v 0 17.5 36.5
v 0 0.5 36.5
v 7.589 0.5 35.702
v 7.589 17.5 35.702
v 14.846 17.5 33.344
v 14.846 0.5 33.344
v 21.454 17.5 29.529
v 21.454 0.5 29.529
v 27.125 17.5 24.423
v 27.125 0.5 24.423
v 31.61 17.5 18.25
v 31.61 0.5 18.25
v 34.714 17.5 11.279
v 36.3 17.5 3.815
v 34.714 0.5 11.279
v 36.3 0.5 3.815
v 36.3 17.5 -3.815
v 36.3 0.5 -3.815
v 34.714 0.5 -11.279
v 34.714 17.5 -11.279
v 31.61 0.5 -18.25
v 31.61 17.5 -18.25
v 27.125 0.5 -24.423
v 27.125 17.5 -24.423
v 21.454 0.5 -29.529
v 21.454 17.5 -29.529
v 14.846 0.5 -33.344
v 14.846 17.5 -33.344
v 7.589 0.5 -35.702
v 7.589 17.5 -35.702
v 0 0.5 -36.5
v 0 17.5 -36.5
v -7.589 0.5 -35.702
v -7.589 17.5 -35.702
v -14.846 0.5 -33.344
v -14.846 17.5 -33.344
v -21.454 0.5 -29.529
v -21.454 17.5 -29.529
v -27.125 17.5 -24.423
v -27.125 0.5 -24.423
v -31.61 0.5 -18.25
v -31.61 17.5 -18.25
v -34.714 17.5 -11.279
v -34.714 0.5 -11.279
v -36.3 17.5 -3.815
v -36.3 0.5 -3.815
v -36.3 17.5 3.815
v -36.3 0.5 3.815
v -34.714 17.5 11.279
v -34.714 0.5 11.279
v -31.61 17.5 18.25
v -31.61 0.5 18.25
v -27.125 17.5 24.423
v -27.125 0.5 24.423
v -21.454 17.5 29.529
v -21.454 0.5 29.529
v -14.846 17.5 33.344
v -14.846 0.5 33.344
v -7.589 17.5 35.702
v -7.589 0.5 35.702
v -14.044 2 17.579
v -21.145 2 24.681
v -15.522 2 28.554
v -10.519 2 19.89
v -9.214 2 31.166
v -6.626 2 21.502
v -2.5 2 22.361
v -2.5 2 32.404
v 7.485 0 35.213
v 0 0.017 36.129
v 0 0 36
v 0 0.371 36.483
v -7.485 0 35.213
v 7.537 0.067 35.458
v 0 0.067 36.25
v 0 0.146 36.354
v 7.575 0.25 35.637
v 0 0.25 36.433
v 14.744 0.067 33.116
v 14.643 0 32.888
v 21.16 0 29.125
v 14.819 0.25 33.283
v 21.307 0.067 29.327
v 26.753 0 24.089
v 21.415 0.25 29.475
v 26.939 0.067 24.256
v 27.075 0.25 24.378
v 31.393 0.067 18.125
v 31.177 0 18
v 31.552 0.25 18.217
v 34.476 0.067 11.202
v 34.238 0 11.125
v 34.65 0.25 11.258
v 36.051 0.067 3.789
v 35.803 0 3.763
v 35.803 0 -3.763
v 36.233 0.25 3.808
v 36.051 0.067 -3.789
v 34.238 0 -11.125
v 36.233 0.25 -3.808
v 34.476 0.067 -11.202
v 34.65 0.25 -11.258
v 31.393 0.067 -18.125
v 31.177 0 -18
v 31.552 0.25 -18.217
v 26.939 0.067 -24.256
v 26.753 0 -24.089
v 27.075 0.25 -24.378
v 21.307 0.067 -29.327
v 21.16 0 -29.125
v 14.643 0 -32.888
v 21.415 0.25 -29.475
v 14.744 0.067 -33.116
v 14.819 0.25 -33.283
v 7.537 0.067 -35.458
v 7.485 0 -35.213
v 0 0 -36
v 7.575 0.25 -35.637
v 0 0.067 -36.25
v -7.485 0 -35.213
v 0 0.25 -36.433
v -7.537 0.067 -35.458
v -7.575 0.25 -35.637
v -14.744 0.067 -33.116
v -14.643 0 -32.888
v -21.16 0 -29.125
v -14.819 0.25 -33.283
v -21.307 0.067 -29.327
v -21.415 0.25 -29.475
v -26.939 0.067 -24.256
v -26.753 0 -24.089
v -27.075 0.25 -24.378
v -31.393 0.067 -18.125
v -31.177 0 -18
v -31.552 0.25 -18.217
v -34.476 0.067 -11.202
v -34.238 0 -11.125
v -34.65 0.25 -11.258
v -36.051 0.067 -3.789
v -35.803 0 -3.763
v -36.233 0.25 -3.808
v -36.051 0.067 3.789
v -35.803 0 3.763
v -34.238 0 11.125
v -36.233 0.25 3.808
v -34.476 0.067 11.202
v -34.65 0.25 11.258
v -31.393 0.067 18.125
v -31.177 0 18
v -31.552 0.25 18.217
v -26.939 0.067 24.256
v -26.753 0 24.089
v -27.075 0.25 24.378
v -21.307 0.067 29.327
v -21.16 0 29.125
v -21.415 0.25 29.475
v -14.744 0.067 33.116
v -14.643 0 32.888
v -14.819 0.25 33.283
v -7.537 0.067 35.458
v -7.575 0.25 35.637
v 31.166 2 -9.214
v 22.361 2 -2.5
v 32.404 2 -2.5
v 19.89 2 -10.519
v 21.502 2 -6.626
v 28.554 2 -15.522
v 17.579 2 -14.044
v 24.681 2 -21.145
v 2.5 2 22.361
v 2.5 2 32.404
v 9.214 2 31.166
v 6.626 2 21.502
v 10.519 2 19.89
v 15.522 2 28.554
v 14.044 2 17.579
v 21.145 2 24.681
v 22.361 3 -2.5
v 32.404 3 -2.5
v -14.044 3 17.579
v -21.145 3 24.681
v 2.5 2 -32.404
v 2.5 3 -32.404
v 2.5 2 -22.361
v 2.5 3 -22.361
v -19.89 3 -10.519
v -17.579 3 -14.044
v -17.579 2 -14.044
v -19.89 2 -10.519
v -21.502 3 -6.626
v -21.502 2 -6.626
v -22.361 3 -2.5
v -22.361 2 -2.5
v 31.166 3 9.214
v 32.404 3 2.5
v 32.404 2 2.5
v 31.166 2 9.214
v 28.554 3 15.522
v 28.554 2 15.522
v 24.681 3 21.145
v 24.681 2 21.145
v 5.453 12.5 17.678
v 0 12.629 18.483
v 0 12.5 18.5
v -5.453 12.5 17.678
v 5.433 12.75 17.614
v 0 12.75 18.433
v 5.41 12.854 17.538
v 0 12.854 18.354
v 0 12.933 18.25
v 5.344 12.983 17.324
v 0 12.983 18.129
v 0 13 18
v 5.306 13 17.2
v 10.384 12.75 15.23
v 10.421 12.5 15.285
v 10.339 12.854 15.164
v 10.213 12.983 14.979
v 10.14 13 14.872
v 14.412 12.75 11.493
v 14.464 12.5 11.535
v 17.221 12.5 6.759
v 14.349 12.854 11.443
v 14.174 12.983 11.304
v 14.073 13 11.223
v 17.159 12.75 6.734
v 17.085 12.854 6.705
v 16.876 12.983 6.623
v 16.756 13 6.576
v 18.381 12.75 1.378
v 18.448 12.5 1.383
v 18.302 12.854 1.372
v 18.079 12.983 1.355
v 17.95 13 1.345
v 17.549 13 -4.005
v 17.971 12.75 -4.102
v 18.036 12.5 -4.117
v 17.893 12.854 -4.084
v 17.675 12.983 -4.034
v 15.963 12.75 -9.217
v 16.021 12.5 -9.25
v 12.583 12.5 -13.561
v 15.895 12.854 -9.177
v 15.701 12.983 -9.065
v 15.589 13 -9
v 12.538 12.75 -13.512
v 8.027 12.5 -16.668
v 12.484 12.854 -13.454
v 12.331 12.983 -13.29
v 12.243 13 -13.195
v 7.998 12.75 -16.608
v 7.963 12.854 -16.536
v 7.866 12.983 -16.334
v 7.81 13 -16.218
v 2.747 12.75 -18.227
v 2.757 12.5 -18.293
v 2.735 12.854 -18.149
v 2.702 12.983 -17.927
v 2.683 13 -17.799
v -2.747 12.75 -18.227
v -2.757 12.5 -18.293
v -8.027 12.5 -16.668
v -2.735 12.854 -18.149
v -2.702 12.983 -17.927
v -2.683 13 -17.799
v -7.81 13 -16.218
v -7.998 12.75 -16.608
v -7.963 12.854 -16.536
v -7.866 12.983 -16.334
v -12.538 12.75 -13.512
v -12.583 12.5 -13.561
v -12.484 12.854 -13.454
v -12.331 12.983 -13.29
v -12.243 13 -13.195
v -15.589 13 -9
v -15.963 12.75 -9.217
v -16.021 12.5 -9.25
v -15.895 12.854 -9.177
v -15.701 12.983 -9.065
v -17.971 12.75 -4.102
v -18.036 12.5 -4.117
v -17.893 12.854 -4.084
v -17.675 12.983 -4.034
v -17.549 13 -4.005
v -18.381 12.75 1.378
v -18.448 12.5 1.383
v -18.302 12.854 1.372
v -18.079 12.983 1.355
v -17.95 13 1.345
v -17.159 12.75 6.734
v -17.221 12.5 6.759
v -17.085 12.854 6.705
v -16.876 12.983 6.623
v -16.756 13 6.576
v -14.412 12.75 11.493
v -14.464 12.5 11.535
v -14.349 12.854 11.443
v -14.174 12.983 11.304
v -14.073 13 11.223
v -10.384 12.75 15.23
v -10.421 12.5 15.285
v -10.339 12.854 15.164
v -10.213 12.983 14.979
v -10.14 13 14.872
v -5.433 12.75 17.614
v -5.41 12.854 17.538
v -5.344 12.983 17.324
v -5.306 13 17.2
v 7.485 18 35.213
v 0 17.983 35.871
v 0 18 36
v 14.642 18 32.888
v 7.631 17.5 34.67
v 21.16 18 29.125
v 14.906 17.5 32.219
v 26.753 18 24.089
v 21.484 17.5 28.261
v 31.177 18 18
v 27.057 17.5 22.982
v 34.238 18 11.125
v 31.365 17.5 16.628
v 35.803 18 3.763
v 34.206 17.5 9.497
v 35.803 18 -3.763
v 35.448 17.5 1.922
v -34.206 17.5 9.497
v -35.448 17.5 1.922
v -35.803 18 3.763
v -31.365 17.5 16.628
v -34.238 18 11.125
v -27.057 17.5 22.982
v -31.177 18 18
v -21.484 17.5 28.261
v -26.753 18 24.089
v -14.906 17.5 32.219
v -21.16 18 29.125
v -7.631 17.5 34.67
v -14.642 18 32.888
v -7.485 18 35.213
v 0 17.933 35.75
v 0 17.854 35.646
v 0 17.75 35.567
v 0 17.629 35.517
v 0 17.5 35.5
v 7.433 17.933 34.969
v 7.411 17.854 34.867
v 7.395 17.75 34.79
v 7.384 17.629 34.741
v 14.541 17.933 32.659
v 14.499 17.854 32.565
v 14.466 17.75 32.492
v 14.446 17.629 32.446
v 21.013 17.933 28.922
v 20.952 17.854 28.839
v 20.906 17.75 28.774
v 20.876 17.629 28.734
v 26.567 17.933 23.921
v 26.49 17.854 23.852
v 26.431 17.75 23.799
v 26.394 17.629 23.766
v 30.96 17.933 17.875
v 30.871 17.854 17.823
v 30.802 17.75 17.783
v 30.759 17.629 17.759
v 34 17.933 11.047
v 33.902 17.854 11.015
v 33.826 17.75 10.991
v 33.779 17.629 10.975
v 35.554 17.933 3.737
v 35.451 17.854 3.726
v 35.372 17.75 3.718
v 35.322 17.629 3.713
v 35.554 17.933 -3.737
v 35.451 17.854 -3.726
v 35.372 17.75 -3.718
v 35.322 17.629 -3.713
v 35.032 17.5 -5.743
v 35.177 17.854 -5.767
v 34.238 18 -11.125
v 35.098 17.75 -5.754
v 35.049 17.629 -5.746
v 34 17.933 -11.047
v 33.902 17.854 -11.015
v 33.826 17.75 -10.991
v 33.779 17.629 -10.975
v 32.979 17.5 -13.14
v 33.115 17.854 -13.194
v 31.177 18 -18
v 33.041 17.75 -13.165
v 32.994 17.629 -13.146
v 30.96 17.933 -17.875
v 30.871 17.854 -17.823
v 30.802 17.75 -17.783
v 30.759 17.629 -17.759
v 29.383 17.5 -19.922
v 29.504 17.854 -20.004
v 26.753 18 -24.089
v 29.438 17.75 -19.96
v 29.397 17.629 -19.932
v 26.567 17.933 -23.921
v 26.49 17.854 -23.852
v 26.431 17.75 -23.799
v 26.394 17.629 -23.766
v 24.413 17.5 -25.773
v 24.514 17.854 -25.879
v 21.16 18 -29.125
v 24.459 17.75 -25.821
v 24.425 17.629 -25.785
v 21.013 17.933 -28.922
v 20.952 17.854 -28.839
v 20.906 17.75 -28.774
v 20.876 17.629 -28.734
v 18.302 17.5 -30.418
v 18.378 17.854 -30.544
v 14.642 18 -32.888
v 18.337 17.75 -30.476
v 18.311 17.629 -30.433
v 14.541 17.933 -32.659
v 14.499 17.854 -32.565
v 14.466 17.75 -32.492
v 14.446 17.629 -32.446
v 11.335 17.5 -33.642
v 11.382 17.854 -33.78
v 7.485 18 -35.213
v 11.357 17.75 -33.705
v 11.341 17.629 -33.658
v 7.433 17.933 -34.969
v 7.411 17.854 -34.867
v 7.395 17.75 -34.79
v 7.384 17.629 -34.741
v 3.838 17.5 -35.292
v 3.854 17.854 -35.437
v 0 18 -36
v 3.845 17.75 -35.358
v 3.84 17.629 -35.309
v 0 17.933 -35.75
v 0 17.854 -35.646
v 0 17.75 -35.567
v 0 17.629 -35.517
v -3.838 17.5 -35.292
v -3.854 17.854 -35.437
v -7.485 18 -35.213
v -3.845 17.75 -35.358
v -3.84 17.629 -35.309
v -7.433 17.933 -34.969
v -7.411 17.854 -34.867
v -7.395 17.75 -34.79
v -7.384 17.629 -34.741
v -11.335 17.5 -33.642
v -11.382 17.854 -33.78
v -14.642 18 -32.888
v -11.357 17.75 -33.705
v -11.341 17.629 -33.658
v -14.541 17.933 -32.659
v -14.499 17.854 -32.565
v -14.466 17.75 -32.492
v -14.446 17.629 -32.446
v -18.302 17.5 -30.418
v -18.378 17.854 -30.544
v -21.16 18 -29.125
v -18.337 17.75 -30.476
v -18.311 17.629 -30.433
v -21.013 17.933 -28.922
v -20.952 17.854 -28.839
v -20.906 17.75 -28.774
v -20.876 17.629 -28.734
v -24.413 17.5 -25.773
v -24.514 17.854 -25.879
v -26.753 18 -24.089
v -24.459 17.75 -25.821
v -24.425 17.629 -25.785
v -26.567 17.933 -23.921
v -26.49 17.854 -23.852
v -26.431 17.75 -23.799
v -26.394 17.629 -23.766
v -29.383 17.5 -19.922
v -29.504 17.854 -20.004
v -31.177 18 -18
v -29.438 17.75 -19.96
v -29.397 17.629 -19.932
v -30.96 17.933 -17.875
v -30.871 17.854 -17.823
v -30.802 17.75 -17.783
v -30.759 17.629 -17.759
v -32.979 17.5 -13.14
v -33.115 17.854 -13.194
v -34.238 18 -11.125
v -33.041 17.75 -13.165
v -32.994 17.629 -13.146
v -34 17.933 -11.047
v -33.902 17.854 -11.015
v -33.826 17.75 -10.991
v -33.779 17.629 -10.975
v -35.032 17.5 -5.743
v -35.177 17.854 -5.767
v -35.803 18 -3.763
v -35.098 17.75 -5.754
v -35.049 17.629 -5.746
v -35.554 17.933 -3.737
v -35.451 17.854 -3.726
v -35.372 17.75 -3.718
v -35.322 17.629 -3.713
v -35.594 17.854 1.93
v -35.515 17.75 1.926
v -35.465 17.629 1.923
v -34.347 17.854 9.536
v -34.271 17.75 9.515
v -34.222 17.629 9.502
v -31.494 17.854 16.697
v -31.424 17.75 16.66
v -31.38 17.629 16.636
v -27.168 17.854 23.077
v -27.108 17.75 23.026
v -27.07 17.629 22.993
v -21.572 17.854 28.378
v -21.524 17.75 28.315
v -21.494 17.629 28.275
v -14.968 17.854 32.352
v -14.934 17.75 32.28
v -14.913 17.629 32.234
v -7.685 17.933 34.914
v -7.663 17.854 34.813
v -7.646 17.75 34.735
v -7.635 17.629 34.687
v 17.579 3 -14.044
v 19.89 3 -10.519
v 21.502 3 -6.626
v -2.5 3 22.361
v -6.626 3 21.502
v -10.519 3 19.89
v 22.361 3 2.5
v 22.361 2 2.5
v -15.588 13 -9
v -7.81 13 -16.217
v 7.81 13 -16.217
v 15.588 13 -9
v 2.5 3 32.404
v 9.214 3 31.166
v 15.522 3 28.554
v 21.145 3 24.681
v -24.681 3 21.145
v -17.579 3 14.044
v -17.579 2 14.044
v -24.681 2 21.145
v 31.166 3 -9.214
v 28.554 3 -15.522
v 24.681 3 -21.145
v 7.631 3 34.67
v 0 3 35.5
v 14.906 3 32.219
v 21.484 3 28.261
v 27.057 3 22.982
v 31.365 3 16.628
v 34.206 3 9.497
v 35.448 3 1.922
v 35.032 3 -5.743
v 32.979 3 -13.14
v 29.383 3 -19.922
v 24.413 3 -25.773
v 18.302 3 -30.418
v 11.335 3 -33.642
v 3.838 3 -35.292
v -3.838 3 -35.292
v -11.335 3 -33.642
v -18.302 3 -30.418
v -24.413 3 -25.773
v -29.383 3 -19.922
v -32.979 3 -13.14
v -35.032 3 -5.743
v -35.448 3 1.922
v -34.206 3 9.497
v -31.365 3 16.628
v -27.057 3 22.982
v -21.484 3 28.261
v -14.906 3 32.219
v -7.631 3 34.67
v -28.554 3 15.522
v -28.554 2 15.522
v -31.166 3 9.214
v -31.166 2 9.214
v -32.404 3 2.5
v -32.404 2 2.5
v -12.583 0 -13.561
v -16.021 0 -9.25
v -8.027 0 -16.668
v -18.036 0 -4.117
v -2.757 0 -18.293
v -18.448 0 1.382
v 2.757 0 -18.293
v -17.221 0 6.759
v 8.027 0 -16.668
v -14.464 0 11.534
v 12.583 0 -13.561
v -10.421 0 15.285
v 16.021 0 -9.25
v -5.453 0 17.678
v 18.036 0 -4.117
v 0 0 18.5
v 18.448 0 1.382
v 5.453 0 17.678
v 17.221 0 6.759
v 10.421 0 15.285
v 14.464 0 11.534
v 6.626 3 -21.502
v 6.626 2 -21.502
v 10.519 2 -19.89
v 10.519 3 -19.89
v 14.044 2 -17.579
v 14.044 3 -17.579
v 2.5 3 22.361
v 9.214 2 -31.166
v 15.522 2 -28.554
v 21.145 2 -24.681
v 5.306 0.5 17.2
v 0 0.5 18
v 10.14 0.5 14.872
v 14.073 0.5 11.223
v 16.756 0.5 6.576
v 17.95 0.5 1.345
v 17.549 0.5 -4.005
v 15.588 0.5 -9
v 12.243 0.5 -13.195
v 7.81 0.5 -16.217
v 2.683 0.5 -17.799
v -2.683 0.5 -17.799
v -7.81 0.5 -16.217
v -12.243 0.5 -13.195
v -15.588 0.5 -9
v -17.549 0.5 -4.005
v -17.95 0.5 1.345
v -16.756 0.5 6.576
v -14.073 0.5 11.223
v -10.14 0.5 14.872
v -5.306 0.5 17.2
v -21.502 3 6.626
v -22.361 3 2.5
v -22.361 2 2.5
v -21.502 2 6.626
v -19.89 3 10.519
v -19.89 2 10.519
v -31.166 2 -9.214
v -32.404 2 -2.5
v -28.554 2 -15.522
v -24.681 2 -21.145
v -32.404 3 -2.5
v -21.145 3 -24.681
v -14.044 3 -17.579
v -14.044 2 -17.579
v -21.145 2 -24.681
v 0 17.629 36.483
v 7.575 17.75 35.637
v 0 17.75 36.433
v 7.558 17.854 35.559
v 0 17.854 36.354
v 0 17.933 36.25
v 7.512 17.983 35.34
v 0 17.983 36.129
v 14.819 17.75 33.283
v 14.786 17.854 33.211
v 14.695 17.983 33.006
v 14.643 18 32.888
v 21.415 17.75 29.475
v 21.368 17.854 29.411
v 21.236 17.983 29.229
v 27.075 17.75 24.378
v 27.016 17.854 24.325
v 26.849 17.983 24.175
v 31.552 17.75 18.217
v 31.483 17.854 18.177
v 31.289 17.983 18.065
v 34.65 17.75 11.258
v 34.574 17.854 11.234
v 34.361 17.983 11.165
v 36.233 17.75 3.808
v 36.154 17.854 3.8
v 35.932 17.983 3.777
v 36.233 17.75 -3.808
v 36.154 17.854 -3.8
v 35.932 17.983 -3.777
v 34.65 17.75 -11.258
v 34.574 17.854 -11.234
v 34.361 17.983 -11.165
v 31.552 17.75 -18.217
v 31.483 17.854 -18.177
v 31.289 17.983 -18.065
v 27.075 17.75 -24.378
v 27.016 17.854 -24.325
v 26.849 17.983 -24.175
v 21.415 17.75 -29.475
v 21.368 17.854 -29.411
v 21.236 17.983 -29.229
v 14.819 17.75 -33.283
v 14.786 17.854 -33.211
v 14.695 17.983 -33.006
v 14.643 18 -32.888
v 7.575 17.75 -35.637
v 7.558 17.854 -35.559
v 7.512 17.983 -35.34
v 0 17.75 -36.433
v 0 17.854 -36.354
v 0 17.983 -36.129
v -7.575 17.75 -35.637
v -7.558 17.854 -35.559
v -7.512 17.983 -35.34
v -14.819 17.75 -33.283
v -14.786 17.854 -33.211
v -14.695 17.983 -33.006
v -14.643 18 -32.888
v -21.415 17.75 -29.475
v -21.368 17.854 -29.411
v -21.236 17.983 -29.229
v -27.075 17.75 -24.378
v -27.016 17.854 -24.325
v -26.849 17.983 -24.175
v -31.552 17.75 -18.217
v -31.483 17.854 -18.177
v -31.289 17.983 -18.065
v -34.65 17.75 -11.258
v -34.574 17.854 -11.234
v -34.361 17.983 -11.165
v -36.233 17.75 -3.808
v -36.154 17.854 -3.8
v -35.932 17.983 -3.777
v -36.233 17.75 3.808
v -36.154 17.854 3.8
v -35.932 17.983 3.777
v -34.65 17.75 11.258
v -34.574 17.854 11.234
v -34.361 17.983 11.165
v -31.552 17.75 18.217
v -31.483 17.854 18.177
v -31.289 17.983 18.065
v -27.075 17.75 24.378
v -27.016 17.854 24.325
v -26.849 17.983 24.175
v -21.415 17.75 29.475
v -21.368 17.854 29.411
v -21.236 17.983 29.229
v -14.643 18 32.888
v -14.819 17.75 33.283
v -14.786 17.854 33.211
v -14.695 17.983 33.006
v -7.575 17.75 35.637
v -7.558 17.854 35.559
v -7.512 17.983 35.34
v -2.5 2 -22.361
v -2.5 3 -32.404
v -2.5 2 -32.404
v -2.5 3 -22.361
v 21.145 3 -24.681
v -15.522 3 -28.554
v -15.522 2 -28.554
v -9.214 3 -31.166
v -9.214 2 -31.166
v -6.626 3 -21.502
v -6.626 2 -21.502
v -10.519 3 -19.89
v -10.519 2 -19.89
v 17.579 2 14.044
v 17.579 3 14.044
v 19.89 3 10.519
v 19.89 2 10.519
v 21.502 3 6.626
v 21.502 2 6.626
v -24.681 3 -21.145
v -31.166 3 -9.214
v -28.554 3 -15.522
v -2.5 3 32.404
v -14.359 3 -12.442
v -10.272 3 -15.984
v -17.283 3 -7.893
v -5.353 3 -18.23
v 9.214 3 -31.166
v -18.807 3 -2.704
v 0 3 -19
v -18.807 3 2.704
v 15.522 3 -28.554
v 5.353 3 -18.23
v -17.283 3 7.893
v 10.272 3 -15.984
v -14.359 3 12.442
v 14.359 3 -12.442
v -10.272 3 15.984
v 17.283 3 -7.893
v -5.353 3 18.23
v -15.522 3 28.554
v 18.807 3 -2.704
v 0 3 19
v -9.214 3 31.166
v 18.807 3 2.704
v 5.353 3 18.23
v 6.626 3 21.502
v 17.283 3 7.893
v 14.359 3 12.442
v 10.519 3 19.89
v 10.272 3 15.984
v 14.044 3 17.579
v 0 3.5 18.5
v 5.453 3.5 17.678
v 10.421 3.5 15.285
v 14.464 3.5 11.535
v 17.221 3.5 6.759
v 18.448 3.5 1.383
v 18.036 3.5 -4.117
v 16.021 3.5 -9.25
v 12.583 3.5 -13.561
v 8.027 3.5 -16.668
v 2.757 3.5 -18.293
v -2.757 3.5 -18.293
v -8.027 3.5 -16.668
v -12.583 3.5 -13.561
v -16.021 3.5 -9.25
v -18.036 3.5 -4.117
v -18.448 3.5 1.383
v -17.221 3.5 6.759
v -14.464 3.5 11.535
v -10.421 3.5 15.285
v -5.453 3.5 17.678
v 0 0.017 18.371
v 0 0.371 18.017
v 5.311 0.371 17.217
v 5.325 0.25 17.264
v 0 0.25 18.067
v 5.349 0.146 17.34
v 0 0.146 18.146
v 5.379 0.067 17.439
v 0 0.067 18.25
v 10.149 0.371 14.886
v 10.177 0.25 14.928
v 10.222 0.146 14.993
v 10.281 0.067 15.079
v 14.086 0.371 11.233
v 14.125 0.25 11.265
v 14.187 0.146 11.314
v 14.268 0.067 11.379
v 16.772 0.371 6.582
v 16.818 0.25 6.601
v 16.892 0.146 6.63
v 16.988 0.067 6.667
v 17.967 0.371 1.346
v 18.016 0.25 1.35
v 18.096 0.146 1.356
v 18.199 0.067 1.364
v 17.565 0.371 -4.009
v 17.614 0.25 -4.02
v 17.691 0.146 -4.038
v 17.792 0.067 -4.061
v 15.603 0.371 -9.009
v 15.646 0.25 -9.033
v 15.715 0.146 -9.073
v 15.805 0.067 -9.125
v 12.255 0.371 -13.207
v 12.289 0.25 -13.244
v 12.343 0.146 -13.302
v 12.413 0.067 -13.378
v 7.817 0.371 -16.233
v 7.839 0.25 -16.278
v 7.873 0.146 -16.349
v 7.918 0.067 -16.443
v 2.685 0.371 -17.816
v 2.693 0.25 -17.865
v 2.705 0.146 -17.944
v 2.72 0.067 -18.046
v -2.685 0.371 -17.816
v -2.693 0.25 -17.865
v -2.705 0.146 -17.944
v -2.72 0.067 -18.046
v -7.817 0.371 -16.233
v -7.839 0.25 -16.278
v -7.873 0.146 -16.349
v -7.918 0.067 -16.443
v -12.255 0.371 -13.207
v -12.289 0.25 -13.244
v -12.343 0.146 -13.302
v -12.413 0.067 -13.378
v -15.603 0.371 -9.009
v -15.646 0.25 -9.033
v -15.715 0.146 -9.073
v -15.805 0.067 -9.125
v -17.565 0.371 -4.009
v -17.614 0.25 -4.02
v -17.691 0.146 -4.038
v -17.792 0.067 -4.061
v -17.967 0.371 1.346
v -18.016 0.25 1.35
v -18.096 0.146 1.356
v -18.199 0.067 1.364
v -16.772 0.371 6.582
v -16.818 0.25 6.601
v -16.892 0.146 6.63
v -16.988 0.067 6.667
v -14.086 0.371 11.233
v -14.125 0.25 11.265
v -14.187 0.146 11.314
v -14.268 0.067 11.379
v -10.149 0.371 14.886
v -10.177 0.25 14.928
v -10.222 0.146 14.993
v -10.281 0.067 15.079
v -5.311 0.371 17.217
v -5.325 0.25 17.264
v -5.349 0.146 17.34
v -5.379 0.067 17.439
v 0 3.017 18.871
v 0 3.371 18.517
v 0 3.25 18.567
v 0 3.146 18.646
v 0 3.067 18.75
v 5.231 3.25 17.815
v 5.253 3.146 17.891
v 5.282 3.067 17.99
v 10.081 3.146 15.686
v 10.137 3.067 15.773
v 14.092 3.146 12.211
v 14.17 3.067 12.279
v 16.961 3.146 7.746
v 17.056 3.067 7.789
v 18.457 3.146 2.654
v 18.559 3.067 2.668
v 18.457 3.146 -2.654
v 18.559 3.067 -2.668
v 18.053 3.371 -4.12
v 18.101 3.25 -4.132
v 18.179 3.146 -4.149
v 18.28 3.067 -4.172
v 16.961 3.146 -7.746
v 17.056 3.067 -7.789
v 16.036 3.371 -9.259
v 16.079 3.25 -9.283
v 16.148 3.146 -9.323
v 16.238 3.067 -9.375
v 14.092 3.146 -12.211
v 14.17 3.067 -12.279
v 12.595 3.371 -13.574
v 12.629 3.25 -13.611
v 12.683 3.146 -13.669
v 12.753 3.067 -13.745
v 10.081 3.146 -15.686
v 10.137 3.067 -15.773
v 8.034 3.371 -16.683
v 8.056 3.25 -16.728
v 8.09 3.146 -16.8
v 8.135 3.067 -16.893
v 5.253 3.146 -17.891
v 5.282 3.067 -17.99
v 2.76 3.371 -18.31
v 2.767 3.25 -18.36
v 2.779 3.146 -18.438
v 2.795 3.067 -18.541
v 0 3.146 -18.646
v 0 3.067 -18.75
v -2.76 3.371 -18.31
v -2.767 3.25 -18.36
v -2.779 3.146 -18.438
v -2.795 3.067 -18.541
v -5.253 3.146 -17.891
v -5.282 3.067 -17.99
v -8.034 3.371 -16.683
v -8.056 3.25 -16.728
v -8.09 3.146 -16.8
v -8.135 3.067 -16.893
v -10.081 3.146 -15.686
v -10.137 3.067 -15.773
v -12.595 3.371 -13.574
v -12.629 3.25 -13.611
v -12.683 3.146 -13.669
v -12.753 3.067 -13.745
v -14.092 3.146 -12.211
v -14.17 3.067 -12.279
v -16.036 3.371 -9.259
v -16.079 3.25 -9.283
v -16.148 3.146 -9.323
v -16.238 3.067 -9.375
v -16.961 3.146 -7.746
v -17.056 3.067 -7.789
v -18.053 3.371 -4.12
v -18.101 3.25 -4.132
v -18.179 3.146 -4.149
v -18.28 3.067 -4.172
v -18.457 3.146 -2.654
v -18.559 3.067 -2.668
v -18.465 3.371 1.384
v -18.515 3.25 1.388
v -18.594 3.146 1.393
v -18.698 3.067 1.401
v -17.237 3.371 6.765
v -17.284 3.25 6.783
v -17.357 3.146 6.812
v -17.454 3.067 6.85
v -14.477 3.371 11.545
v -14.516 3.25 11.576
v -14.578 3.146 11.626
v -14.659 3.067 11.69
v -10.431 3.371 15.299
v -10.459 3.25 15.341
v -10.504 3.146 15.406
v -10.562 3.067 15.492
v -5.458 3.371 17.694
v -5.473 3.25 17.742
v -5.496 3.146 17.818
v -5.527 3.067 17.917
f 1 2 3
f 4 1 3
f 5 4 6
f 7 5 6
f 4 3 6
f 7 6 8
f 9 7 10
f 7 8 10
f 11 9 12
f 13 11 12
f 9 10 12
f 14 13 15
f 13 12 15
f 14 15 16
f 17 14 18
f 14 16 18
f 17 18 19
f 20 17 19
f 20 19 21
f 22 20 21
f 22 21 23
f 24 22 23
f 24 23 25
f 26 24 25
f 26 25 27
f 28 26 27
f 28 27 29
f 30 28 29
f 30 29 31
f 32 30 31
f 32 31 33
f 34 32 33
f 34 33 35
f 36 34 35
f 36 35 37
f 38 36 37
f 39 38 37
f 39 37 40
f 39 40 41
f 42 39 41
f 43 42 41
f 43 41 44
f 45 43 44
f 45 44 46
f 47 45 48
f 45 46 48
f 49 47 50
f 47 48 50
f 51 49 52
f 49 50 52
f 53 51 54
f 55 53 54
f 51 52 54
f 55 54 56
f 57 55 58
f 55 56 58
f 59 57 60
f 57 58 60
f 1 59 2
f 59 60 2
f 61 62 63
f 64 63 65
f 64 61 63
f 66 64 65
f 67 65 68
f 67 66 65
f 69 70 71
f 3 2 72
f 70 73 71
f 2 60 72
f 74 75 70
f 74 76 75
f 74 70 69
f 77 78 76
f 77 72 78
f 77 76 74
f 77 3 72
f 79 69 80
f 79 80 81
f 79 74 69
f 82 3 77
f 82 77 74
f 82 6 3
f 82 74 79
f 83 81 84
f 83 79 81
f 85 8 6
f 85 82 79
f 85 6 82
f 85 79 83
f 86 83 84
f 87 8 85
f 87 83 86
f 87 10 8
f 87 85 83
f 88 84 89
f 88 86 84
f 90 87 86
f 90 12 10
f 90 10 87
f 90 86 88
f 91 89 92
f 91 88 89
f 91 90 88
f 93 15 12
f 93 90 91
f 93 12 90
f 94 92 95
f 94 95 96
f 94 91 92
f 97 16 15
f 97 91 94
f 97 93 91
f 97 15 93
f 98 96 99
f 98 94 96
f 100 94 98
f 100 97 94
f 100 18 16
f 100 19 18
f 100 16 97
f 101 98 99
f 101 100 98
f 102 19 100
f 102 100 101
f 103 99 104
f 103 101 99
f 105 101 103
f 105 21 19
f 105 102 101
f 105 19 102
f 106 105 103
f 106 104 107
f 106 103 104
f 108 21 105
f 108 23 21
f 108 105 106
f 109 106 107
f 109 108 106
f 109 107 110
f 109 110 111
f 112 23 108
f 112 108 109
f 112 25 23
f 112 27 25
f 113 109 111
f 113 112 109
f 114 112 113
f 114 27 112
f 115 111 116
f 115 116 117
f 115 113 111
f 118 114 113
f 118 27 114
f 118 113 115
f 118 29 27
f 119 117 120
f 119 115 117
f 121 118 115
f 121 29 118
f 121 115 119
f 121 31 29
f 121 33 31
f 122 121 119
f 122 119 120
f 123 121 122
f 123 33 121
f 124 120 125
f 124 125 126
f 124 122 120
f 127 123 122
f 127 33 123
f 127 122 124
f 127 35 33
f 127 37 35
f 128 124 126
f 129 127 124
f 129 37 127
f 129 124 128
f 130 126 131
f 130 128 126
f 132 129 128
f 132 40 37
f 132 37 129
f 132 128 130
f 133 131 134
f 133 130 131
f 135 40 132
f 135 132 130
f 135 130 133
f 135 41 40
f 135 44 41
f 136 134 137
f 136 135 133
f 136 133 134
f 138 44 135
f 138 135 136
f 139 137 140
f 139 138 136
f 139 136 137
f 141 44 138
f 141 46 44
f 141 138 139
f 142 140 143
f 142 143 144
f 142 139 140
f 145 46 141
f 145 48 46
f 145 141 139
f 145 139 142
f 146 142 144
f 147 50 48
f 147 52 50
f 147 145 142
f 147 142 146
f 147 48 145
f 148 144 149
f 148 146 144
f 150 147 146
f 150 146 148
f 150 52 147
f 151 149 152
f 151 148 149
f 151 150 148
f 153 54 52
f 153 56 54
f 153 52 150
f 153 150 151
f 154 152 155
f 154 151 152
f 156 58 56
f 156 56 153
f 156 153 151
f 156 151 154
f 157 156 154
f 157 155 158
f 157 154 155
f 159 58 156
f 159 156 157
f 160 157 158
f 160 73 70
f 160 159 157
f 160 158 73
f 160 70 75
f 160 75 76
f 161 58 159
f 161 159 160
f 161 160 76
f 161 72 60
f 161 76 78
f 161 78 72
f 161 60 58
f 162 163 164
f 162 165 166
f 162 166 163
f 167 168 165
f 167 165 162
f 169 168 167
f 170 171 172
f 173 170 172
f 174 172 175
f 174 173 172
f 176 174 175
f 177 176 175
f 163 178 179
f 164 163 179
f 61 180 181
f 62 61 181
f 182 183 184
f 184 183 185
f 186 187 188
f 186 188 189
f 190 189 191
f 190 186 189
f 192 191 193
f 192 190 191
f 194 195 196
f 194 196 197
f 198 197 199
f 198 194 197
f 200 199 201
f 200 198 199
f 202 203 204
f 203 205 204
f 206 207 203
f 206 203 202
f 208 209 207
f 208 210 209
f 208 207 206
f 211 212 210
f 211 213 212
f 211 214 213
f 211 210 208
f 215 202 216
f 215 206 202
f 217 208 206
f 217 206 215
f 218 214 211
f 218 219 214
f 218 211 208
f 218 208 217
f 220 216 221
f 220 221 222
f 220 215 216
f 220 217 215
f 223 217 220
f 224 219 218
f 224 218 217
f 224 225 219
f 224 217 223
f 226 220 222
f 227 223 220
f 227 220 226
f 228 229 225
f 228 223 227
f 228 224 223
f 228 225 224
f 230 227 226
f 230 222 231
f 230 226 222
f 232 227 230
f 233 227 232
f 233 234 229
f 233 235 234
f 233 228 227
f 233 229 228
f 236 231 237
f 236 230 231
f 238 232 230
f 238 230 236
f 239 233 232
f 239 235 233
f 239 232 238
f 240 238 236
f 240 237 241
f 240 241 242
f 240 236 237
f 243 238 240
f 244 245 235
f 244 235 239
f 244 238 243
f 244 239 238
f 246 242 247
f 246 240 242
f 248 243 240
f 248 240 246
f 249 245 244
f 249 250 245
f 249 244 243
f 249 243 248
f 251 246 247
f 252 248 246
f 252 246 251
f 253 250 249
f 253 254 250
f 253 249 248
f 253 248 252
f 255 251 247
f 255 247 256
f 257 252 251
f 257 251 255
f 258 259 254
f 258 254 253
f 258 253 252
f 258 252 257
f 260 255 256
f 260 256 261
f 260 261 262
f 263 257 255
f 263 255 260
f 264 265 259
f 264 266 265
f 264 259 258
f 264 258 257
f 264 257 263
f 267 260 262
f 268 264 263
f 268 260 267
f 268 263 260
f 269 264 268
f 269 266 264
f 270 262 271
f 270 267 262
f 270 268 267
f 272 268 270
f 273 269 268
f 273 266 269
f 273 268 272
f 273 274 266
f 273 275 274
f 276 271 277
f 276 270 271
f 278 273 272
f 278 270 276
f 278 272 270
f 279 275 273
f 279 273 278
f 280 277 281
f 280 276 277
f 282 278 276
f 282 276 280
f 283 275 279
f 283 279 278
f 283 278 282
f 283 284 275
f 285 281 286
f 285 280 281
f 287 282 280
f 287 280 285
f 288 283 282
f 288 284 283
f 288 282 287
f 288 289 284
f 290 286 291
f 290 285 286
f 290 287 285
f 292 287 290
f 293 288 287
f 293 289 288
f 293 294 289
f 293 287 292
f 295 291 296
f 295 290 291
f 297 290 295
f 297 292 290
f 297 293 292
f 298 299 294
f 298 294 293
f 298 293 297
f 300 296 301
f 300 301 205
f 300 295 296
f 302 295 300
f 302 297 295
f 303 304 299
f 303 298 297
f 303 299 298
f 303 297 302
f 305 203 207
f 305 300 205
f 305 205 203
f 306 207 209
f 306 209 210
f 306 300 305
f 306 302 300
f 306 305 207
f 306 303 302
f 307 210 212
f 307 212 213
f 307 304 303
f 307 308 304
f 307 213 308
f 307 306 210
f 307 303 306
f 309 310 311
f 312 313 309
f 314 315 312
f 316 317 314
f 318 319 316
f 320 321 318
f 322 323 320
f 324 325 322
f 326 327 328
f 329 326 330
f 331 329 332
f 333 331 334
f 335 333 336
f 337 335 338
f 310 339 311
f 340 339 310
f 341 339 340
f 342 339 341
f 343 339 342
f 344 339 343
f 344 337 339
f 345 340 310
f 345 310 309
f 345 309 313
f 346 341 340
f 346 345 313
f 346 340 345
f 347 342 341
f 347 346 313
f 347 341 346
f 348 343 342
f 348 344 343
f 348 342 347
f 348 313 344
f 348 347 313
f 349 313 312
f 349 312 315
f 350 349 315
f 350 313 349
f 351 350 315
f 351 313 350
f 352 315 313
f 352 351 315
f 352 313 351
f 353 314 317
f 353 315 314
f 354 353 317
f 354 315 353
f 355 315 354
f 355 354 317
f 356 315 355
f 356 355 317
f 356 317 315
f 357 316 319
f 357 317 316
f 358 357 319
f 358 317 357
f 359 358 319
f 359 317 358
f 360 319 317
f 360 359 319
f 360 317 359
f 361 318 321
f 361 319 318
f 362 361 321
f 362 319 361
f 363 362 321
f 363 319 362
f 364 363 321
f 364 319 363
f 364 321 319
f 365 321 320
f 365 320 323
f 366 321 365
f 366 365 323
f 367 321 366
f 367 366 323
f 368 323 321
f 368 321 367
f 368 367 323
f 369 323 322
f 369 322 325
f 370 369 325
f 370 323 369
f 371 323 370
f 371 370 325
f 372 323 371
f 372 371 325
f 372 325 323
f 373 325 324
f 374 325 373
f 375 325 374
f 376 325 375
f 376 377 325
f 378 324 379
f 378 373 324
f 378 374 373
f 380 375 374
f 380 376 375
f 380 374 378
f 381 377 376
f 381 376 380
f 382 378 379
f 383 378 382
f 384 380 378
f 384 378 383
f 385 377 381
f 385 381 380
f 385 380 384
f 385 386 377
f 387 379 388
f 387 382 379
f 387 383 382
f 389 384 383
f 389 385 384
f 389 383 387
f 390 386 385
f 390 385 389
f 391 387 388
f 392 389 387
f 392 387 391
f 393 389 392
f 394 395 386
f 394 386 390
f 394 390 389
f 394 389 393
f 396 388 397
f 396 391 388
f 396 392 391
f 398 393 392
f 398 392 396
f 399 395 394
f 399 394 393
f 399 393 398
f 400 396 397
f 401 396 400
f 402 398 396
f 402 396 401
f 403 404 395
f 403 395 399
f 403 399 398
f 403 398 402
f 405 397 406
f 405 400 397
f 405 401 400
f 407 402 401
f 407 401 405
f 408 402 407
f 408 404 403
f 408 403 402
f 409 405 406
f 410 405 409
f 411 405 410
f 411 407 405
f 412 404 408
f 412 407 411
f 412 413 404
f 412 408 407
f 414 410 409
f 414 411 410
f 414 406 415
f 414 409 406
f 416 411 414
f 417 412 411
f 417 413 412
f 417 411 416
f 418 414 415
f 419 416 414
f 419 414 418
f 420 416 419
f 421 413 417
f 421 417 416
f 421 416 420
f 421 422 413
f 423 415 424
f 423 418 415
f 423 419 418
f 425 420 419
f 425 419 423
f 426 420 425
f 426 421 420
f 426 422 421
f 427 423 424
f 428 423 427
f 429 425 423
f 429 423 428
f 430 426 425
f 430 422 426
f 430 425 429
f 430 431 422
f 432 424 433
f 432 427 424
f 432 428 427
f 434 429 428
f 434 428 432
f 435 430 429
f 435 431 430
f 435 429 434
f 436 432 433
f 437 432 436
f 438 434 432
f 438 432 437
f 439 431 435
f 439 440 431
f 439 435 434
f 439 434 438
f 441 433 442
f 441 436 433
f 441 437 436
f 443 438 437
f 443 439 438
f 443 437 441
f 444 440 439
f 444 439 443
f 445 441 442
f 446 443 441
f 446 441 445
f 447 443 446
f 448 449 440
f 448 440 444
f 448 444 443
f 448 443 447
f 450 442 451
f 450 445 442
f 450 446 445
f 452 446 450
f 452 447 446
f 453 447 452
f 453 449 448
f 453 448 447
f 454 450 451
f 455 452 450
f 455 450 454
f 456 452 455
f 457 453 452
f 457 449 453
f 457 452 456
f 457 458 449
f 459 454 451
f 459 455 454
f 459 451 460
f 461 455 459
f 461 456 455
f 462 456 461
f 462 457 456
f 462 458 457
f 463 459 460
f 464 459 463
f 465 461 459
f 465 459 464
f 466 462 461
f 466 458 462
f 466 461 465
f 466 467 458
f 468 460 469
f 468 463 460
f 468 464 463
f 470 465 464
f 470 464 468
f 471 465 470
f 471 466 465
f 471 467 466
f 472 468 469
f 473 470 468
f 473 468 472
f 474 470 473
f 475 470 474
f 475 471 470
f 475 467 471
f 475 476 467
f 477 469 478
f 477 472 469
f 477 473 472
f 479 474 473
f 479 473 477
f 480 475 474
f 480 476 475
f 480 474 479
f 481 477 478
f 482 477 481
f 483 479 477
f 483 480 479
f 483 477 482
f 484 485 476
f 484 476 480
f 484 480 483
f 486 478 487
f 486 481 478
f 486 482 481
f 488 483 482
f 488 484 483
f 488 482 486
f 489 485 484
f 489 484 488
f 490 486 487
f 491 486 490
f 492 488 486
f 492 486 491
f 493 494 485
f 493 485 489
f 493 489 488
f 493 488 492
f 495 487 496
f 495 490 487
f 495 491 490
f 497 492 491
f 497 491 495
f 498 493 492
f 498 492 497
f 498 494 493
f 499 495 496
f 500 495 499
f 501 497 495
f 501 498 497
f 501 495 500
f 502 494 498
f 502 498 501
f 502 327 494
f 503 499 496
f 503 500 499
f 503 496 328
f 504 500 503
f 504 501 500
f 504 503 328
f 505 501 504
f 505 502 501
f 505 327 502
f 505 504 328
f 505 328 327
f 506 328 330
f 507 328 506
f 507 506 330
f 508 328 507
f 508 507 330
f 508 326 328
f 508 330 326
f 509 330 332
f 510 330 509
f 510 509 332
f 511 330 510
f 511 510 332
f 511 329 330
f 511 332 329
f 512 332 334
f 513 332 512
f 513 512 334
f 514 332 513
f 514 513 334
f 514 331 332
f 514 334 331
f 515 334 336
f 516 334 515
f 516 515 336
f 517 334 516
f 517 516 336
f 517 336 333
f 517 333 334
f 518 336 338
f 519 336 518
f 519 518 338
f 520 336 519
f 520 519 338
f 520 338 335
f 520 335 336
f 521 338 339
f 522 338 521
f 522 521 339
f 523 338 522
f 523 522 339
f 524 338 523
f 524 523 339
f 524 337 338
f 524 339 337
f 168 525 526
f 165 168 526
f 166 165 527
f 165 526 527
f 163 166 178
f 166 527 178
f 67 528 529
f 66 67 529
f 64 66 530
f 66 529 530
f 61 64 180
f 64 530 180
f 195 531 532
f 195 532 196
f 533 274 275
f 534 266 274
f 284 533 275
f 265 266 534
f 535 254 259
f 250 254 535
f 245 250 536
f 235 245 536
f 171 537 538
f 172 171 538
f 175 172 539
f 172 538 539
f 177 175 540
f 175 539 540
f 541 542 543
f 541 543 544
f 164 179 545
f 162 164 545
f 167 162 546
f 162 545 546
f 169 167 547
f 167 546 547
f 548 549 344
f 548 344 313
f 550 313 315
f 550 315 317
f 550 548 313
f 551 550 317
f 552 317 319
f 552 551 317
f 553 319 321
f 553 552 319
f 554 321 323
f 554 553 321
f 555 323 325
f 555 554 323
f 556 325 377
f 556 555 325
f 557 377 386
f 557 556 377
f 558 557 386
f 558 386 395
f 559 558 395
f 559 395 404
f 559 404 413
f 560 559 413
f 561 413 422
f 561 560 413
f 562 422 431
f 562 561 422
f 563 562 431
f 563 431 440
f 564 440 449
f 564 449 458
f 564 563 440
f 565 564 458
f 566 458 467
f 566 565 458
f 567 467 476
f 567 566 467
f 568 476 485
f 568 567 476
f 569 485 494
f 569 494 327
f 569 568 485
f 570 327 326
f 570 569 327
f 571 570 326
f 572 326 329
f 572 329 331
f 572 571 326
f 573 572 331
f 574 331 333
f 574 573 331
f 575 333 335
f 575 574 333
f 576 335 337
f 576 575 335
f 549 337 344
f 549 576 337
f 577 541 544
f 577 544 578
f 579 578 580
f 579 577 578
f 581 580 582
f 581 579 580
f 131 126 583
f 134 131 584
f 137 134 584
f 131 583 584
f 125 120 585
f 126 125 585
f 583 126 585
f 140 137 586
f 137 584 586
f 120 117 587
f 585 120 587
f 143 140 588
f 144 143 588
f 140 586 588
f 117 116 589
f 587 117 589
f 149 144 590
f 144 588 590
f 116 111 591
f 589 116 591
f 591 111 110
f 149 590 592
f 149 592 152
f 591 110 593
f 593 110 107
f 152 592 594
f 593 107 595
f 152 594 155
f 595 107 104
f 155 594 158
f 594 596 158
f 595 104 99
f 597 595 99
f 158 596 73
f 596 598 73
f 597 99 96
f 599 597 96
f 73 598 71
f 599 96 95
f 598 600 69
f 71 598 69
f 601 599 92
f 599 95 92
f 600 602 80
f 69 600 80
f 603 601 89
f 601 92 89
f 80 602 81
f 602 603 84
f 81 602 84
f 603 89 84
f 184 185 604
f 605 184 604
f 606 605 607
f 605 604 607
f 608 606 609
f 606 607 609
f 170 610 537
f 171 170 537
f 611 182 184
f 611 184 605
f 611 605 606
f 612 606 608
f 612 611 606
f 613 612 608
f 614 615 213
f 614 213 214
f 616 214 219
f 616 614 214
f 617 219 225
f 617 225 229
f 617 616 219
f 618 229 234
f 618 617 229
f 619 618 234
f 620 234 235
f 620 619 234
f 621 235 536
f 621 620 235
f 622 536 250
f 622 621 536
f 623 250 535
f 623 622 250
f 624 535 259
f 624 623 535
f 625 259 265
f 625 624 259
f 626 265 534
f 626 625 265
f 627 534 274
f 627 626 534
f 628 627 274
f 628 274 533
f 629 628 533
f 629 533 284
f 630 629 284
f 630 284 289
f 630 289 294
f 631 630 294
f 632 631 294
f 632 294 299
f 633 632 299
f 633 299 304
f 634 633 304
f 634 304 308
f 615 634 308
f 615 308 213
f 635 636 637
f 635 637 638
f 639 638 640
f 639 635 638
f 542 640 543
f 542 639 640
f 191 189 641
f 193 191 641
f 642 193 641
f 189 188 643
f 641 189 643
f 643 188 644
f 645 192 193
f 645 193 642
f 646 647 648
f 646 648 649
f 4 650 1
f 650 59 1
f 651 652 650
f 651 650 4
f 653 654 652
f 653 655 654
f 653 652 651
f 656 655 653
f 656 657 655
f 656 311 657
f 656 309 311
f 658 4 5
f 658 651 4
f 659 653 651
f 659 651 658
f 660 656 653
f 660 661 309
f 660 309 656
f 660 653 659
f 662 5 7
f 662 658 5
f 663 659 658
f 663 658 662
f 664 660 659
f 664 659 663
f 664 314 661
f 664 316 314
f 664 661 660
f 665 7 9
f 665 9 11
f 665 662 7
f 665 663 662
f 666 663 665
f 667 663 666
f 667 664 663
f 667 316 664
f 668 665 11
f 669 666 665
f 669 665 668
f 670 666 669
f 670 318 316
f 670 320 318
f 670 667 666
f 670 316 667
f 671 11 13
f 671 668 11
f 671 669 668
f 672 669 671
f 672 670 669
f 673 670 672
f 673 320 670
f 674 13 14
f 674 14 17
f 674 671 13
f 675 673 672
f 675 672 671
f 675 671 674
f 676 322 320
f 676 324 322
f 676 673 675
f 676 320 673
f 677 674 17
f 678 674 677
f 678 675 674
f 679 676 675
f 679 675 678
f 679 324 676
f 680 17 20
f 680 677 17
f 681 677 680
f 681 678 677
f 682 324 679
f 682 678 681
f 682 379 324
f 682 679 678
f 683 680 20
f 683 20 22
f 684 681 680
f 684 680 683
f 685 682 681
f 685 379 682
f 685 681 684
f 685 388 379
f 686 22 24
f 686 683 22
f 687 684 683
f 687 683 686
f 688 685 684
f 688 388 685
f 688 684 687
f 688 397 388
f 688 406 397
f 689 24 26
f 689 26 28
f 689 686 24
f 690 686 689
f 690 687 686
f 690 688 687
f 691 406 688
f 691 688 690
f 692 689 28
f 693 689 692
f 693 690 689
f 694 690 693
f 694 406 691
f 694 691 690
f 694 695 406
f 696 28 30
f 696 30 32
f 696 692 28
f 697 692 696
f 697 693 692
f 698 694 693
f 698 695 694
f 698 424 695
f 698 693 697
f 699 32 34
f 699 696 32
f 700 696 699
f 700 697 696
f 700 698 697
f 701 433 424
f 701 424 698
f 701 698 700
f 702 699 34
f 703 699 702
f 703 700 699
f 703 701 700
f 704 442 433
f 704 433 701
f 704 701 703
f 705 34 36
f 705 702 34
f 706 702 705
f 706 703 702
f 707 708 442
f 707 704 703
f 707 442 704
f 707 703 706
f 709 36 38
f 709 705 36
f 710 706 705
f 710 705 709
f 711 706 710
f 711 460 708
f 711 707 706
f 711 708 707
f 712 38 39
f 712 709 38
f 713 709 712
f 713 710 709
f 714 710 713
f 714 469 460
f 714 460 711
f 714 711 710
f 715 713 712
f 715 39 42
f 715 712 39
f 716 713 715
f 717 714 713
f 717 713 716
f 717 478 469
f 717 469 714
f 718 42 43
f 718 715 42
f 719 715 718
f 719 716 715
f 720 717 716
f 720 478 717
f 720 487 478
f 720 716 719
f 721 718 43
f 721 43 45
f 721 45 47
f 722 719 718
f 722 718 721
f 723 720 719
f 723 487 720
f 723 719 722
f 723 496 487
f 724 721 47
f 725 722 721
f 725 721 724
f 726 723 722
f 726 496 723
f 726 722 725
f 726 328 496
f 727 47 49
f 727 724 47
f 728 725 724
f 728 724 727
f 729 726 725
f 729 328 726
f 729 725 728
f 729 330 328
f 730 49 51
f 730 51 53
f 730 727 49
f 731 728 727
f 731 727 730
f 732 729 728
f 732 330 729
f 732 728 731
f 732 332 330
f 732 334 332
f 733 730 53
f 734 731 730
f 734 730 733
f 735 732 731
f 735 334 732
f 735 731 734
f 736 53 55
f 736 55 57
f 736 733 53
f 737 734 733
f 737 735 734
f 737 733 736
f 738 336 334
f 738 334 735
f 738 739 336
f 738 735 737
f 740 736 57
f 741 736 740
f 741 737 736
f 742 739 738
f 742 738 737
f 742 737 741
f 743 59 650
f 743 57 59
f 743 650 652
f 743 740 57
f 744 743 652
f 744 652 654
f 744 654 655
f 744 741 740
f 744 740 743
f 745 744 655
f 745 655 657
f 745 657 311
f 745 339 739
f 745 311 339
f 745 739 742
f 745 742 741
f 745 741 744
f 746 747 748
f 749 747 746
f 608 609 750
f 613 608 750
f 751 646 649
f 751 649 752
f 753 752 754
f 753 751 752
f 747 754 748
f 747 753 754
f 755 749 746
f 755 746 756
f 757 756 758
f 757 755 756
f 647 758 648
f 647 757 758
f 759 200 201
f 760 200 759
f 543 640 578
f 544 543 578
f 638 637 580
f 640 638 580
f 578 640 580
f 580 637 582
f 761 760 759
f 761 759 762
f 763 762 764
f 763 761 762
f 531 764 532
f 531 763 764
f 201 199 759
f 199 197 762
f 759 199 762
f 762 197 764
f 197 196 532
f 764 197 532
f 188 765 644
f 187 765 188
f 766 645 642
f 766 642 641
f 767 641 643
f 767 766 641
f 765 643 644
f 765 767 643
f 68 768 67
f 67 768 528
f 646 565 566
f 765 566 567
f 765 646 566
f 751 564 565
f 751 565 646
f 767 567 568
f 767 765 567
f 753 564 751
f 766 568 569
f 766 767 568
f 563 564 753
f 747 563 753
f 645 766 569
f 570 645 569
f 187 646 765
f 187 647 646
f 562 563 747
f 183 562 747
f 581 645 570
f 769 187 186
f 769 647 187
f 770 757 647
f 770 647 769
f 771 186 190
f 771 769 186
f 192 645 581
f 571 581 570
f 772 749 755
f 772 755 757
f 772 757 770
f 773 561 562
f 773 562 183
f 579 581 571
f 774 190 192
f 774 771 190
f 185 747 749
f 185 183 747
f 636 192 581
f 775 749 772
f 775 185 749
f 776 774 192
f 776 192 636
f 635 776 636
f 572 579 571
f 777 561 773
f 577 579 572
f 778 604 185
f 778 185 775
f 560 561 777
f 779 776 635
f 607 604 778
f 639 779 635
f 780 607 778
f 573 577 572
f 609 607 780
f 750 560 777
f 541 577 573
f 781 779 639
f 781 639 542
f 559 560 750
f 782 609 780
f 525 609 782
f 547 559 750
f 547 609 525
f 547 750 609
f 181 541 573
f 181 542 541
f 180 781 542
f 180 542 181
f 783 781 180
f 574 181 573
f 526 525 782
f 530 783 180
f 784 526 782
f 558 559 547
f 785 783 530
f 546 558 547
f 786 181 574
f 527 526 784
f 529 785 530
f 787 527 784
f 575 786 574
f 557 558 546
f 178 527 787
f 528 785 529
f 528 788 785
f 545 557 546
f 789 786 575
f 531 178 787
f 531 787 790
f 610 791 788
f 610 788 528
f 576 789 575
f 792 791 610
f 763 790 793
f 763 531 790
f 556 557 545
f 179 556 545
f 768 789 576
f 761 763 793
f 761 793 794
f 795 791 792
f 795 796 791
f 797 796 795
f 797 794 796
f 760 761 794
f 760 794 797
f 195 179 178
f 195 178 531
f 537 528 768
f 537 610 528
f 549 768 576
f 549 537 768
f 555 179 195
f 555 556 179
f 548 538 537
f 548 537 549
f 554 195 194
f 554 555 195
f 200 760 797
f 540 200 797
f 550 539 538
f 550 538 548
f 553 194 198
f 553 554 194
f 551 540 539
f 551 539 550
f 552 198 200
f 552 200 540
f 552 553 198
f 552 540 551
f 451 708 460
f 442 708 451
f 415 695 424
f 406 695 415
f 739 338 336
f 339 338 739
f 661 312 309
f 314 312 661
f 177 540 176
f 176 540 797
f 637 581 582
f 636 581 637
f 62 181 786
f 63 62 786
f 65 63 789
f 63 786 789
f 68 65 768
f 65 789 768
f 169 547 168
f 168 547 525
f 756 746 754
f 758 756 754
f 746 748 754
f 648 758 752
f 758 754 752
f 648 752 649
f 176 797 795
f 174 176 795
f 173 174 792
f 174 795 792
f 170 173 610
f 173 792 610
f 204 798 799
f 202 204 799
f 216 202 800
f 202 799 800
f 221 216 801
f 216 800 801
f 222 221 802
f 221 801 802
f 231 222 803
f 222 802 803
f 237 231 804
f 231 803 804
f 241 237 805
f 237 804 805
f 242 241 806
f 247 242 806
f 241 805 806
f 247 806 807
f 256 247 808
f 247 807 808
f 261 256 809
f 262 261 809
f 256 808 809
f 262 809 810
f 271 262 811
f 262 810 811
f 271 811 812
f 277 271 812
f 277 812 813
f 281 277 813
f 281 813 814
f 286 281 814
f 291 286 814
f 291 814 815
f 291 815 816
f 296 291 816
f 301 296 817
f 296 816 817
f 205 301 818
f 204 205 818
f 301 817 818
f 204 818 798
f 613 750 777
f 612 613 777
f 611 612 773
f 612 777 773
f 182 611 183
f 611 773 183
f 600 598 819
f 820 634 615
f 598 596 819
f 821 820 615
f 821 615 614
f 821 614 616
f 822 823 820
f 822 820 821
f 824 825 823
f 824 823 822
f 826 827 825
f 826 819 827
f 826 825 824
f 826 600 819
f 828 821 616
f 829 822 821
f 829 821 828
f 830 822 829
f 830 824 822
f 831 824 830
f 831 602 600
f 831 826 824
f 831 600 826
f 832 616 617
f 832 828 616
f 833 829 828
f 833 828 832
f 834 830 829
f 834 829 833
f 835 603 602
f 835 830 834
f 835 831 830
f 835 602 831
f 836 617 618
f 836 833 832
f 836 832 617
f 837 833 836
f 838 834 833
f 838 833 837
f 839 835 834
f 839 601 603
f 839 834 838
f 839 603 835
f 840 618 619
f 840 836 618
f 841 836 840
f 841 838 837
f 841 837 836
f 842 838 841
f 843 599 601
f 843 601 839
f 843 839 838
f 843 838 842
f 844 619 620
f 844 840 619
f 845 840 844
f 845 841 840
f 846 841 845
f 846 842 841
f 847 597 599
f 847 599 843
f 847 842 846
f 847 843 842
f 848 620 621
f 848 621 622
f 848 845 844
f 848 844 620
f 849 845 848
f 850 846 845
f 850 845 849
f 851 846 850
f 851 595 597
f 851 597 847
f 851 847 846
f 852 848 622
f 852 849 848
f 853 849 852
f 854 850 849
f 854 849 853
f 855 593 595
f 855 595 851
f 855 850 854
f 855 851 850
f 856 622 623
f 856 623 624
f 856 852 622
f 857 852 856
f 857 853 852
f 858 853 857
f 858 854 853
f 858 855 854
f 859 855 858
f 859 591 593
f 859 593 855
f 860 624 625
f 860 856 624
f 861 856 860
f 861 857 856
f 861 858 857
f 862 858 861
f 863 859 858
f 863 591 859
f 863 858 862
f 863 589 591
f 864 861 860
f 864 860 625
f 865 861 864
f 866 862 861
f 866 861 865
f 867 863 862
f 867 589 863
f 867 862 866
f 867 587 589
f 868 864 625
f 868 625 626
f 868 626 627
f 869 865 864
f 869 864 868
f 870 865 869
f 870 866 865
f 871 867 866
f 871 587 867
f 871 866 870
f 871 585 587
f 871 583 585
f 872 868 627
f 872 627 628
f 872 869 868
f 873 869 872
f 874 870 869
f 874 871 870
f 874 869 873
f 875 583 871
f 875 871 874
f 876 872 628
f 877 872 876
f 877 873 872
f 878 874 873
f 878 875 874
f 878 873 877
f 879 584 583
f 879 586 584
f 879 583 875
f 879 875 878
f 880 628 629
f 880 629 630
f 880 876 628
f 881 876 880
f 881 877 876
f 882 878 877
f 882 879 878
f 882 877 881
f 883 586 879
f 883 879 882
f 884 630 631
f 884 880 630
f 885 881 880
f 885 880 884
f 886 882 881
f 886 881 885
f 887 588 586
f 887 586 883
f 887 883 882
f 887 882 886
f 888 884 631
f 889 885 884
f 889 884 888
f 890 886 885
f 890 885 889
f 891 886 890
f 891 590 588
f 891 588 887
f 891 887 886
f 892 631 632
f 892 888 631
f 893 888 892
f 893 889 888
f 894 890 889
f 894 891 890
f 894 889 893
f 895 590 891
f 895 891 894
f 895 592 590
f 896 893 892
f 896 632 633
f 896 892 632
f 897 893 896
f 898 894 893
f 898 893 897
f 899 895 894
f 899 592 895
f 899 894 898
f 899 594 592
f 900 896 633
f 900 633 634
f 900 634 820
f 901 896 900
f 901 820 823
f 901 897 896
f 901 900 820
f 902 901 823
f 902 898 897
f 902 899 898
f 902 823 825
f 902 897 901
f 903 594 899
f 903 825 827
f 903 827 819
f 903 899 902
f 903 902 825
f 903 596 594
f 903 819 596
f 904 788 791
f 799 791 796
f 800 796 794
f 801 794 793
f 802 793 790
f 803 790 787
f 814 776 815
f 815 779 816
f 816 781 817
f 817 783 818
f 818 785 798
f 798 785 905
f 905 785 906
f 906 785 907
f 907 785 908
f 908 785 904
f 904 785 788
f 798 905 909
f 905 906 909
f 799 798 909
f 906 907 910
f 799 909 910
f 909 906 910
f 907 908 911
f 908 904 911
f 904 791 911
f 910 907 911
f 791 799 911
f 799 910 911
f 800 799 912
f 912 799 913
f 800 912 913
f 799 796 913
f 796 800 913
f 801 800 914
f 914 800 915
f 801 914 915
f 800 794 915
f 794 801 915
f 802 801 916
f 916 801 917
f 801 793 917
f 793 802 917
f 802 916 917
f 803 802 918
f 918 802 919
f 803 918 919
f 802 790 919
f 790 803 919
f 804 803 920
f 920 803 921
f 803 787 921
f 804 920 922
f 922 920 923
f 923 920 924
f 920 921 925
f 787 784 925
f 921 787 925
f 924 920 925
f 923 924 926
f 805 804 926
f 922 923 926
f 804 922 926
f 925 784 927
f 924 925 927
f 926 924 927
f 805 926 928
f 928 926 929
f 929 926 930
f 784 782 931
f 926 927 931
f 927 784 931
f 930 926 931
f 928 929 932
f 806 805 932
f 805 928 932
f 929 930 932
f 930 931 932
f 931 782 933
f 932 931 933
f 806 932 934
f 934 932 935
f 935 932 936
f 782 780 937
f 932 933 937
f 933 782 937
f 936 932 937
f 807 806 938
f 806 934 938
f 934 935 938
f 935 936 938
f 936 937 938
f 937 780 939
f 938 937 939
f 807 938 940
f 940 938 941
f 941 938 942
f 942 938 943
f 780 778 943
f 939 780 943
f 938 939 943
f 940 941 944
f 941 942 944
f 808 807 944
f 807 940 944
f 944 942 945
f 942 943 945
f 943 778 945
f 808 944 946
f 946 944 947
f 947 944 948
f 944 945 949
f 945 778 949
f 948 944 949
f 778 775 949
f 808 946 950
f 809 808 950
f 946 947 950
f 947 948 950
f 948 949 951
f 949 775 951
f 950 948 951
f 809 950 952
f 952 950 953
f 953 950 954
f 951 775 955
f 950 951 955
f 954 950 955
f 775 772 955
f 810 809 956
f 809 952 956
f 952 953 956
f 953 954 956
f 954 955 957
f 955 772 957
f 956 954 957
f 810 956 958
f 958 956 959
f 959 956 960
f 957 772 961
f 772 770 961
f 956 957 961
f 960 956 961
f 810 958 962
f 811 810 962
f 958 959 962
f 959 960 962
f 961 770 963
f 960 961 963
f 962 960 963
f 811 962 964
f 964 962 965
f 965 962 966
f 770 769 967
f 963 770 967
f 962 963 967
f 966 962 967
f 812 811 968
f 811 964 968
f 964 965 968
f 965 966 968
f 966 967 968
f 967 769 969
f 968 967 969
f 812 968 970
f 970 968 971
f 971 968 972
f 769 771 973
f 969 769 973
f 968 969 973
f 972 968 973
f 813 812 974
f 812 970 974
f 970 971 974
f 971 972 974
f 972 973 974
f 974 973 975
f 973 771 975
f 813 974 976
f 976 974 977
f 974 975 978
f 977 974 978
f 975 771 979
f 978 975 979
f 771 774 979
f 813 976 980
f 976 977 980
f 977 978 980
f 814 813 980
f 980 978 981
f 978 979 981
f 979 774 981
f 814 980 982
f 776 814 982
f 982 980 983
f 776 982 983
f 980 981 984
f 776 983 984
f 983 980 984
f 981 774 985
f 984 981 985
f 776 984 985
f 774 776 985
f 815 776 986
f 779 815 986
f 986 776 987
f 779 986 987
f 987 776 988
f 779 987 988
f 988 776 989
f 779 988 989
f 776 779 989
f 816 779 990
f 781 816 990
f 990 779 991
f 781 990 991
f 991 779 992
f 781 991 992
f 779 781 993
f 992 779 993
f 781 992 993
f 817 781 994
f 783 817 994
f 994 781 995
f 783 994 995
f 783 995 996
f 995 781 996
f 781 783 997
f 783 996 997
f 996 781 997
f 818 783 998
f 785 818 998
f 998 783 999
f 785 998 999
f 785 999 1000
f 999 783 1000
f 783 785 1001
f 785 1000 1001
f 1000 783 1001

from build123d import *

# Parameters (mm, degrees)
SKETCH2_R           = 36.5
SKETCH2_R_2         = 18
BOSS_EXTRUDE1_DEPTH = 3
SKETCH3_R           = 36.5
SKETCH3_R_2         = 35.5
BOSS_EXTRUDE2_DEPTH = 15
SKETCH4_R           = 18.5
SKETCH4_R_2         = 18
BOSS_EXTRUDE3_DEPTH = 10
FILLET1_R           = 0.5
CUT_EXTRUDE1_DEPTH  = 1


with BuildPart() as part:
    # Sketch2 → Boss-Extrude1 (new body)
    with BuildSketch(Plane(origin=(0, 0, 0), x_dir=(1, 0, 0), z_dir=(0, 1, 0))):
        with Locations(Location((0, 0, 0), (0, 0, 270))):
            Circle(SKETCH2_R)
        with Locations(Location((0, 0, 0), (0, 0, 270))):
            Circle(SKETCH2_R_2, mode=Mode.SUBTRACT)
    extrude(amount=BOSS_EXTRUDE1_DEPTH)

    # Sketch3 → Boss-Extrude2 (add)
    with BuildSketch(Plane(origin=(0, 3, 0), x_dir=(1, 0, 0), z_dir=(0, 1, 0))):
        with Locations(Location((0, 0, 0), (0, 0, 270))):
            Circle(SKETCH3_R)
        with Locations(Location((0, 0, 0), (0, 0, 270))):
            Circle(SKETCH3_R_2, mode=Mode.SUBTRACT)
    extrude(amount=BOSS_EXTRUDE2_DEPTH)

    # Sketch4 → Boss-Extrude3 (add)
    with BuildSketch(Plane(origin=(0, 3, 0), x_dir=(1, 0, 0), z_dir=(0, 1, 0))):
        with Locations(Location((0, 0, 0), (0, 0, 270))):
            Circle(SKETCH4_R)
        with Locations(Location((0, 0, 0), (0, 0, 270))):
            Circle(SKETCH4_R_2, mode=Mode.SUBTRACT)
    extrude(amount=BOSS_EXTRUDE3_DEPTH)

    # Fillet1
    fillet1_edges = [part.edges().sort_by_distance(p)[0] for p in [
        (0, 18, -35.5),
        (0, 18, -36.5),
        (0, 3, -18.5),
        (0, 13, -18.5),
        (0, 0, -36.5),
        (0, 0, -18),
    ]]
    fillet(fillet1_edges, radius=FILLET1_R - 0.0001)  # a hair under: the kernel refuses the full size

    # Sketch5 → Cut-Extrude1 (cut)
    with BuildSketch(Plane(origin=(0, 3, 0), x_dir=(1, 0, 0), z_dir=(0, 1, 0))):
        with BuildLine():
            ThreePointArc((-2.5, 22.360679775), (-8.610377228, 20.787289482), (-14.043621348, 17.579155254))
            Line((-14.043621348, 17.579155254), (-21.145111522, 24.680645428))
            ThreePointArc((-21.145111522, 24.680645428), (-12.437211552, 30.026084807), (-2.5, 32.403703492))
            Line((-2.5, 32.403703492), (-2.5, 22.360679775))
        make_face()
        with BuildLine():
            Line((14.043621348, 17.579155254), (21.145111522, 24.680645428))
            ThreePointArc((21.145111522, 24.680645428), (12.437211552, 30.026084807), (2.5, 32.403703492))
            Line((2.5, 32.403703492), (2.5, 22.360679775))
            ThreePointArc((2.5, 22.360679775), (8.610377228, 20.787289482), (14.043621348, 17.579155254))
        make_face()
        with BuildLine():
            Line((22.360679775, 2.5), (32.403703492, 2.5))
            ThreePointArc((32.403703492, 2.5), (30.026084807, 12.437211552), (24.680645428, 21.145111522))
            Line((24.680645428, 21.145111522), (17.579155254, 14.043621348))
            ThreePointArc((17.579155254, 14.043621348), (20.787289482, 8.610377228), (22.360679775, 2.5))
        make_face()
        with BuildLine():
            Line((24.680645428, -21.145111522), (17.579155254, -14.043621348))
            ThreePointArc((17.579155254, -14.043621348), (20.787289482, -8.610377228), (22.360679775, -2.5))
            Line((22.360679775, -2.5), (32.403703492, -2.5))
            ThreePointArc((32.403703492, -2.5), (30.026084807, -12.437211552), (24.680645428, -21.145111522))
        make_face()
        with BuildLine():
            ThreePointArc((-17.579155254, 14.043621348), (-20.787289482, 8.610377228), (-22.360679775, 2.5))
            Line((-22.360679775, 2.5), (-32.403703492, 2.5))
            ThreePointArc((-32.403703492, 2.5), (-30.026084807, 12.437211552), (-24.680645428, 21.145111522))
            Line((-24.680645428, 21.145111522), (-17.579155254, 14.043621348))
        make_face()
        with BuildLine():
            ThreePointArc((-22.360679775, -2.5), (-20.787289482, -8.610377228), (-17.579155254, -14.043621348))
            Line((-17.579155254, -14.043621348), (-24.680645428, -21.145111522))
            ThreePointArc((-24.680645428, -21.145111522), (-30.026084807, -12.437211552), (-32.403703492, -2.5))
            Line((-32.403703492, -2.5), (-22.360679775, -2.5))
        make_face()
        with BuildLine():
            Line((-14.043621348, -17.579155254), (-21.145111522, -24.680645428))
            ThreePointArc((-21.145111522, -24.680645428), (-12.437211552, -30.026084807), (-2.5, -32.403703492))
            Line((-2.5, -32.403703492), (-2.5, -22.360679775))
            ThreePointArc((-2.5, -22.360679775), (-8.610377228, -20.787289482), (-14.043621348, -17.579155254))
        make_face()
        with BuildLine():
            Line((2.5, -22.360679775), (2.5, -32.403703492))
            ThreePointArc((2.5, -32.403703492), (12.437211552, -30.026084807), (21.145111522, -24.680645428))
            Line((21.145111522, -24.680645428), (14.043621348, -17.579155254))
            ThreePointArc((14.043621348, -17.579155254), (8.610377228, -20.787289482), (2.5, -22.360679775))
        make_face()
    extrude(amount=-CUT_EXTRUDE1_DEPTH, mode=Mode.SUBTRACT)


solid = part.part
